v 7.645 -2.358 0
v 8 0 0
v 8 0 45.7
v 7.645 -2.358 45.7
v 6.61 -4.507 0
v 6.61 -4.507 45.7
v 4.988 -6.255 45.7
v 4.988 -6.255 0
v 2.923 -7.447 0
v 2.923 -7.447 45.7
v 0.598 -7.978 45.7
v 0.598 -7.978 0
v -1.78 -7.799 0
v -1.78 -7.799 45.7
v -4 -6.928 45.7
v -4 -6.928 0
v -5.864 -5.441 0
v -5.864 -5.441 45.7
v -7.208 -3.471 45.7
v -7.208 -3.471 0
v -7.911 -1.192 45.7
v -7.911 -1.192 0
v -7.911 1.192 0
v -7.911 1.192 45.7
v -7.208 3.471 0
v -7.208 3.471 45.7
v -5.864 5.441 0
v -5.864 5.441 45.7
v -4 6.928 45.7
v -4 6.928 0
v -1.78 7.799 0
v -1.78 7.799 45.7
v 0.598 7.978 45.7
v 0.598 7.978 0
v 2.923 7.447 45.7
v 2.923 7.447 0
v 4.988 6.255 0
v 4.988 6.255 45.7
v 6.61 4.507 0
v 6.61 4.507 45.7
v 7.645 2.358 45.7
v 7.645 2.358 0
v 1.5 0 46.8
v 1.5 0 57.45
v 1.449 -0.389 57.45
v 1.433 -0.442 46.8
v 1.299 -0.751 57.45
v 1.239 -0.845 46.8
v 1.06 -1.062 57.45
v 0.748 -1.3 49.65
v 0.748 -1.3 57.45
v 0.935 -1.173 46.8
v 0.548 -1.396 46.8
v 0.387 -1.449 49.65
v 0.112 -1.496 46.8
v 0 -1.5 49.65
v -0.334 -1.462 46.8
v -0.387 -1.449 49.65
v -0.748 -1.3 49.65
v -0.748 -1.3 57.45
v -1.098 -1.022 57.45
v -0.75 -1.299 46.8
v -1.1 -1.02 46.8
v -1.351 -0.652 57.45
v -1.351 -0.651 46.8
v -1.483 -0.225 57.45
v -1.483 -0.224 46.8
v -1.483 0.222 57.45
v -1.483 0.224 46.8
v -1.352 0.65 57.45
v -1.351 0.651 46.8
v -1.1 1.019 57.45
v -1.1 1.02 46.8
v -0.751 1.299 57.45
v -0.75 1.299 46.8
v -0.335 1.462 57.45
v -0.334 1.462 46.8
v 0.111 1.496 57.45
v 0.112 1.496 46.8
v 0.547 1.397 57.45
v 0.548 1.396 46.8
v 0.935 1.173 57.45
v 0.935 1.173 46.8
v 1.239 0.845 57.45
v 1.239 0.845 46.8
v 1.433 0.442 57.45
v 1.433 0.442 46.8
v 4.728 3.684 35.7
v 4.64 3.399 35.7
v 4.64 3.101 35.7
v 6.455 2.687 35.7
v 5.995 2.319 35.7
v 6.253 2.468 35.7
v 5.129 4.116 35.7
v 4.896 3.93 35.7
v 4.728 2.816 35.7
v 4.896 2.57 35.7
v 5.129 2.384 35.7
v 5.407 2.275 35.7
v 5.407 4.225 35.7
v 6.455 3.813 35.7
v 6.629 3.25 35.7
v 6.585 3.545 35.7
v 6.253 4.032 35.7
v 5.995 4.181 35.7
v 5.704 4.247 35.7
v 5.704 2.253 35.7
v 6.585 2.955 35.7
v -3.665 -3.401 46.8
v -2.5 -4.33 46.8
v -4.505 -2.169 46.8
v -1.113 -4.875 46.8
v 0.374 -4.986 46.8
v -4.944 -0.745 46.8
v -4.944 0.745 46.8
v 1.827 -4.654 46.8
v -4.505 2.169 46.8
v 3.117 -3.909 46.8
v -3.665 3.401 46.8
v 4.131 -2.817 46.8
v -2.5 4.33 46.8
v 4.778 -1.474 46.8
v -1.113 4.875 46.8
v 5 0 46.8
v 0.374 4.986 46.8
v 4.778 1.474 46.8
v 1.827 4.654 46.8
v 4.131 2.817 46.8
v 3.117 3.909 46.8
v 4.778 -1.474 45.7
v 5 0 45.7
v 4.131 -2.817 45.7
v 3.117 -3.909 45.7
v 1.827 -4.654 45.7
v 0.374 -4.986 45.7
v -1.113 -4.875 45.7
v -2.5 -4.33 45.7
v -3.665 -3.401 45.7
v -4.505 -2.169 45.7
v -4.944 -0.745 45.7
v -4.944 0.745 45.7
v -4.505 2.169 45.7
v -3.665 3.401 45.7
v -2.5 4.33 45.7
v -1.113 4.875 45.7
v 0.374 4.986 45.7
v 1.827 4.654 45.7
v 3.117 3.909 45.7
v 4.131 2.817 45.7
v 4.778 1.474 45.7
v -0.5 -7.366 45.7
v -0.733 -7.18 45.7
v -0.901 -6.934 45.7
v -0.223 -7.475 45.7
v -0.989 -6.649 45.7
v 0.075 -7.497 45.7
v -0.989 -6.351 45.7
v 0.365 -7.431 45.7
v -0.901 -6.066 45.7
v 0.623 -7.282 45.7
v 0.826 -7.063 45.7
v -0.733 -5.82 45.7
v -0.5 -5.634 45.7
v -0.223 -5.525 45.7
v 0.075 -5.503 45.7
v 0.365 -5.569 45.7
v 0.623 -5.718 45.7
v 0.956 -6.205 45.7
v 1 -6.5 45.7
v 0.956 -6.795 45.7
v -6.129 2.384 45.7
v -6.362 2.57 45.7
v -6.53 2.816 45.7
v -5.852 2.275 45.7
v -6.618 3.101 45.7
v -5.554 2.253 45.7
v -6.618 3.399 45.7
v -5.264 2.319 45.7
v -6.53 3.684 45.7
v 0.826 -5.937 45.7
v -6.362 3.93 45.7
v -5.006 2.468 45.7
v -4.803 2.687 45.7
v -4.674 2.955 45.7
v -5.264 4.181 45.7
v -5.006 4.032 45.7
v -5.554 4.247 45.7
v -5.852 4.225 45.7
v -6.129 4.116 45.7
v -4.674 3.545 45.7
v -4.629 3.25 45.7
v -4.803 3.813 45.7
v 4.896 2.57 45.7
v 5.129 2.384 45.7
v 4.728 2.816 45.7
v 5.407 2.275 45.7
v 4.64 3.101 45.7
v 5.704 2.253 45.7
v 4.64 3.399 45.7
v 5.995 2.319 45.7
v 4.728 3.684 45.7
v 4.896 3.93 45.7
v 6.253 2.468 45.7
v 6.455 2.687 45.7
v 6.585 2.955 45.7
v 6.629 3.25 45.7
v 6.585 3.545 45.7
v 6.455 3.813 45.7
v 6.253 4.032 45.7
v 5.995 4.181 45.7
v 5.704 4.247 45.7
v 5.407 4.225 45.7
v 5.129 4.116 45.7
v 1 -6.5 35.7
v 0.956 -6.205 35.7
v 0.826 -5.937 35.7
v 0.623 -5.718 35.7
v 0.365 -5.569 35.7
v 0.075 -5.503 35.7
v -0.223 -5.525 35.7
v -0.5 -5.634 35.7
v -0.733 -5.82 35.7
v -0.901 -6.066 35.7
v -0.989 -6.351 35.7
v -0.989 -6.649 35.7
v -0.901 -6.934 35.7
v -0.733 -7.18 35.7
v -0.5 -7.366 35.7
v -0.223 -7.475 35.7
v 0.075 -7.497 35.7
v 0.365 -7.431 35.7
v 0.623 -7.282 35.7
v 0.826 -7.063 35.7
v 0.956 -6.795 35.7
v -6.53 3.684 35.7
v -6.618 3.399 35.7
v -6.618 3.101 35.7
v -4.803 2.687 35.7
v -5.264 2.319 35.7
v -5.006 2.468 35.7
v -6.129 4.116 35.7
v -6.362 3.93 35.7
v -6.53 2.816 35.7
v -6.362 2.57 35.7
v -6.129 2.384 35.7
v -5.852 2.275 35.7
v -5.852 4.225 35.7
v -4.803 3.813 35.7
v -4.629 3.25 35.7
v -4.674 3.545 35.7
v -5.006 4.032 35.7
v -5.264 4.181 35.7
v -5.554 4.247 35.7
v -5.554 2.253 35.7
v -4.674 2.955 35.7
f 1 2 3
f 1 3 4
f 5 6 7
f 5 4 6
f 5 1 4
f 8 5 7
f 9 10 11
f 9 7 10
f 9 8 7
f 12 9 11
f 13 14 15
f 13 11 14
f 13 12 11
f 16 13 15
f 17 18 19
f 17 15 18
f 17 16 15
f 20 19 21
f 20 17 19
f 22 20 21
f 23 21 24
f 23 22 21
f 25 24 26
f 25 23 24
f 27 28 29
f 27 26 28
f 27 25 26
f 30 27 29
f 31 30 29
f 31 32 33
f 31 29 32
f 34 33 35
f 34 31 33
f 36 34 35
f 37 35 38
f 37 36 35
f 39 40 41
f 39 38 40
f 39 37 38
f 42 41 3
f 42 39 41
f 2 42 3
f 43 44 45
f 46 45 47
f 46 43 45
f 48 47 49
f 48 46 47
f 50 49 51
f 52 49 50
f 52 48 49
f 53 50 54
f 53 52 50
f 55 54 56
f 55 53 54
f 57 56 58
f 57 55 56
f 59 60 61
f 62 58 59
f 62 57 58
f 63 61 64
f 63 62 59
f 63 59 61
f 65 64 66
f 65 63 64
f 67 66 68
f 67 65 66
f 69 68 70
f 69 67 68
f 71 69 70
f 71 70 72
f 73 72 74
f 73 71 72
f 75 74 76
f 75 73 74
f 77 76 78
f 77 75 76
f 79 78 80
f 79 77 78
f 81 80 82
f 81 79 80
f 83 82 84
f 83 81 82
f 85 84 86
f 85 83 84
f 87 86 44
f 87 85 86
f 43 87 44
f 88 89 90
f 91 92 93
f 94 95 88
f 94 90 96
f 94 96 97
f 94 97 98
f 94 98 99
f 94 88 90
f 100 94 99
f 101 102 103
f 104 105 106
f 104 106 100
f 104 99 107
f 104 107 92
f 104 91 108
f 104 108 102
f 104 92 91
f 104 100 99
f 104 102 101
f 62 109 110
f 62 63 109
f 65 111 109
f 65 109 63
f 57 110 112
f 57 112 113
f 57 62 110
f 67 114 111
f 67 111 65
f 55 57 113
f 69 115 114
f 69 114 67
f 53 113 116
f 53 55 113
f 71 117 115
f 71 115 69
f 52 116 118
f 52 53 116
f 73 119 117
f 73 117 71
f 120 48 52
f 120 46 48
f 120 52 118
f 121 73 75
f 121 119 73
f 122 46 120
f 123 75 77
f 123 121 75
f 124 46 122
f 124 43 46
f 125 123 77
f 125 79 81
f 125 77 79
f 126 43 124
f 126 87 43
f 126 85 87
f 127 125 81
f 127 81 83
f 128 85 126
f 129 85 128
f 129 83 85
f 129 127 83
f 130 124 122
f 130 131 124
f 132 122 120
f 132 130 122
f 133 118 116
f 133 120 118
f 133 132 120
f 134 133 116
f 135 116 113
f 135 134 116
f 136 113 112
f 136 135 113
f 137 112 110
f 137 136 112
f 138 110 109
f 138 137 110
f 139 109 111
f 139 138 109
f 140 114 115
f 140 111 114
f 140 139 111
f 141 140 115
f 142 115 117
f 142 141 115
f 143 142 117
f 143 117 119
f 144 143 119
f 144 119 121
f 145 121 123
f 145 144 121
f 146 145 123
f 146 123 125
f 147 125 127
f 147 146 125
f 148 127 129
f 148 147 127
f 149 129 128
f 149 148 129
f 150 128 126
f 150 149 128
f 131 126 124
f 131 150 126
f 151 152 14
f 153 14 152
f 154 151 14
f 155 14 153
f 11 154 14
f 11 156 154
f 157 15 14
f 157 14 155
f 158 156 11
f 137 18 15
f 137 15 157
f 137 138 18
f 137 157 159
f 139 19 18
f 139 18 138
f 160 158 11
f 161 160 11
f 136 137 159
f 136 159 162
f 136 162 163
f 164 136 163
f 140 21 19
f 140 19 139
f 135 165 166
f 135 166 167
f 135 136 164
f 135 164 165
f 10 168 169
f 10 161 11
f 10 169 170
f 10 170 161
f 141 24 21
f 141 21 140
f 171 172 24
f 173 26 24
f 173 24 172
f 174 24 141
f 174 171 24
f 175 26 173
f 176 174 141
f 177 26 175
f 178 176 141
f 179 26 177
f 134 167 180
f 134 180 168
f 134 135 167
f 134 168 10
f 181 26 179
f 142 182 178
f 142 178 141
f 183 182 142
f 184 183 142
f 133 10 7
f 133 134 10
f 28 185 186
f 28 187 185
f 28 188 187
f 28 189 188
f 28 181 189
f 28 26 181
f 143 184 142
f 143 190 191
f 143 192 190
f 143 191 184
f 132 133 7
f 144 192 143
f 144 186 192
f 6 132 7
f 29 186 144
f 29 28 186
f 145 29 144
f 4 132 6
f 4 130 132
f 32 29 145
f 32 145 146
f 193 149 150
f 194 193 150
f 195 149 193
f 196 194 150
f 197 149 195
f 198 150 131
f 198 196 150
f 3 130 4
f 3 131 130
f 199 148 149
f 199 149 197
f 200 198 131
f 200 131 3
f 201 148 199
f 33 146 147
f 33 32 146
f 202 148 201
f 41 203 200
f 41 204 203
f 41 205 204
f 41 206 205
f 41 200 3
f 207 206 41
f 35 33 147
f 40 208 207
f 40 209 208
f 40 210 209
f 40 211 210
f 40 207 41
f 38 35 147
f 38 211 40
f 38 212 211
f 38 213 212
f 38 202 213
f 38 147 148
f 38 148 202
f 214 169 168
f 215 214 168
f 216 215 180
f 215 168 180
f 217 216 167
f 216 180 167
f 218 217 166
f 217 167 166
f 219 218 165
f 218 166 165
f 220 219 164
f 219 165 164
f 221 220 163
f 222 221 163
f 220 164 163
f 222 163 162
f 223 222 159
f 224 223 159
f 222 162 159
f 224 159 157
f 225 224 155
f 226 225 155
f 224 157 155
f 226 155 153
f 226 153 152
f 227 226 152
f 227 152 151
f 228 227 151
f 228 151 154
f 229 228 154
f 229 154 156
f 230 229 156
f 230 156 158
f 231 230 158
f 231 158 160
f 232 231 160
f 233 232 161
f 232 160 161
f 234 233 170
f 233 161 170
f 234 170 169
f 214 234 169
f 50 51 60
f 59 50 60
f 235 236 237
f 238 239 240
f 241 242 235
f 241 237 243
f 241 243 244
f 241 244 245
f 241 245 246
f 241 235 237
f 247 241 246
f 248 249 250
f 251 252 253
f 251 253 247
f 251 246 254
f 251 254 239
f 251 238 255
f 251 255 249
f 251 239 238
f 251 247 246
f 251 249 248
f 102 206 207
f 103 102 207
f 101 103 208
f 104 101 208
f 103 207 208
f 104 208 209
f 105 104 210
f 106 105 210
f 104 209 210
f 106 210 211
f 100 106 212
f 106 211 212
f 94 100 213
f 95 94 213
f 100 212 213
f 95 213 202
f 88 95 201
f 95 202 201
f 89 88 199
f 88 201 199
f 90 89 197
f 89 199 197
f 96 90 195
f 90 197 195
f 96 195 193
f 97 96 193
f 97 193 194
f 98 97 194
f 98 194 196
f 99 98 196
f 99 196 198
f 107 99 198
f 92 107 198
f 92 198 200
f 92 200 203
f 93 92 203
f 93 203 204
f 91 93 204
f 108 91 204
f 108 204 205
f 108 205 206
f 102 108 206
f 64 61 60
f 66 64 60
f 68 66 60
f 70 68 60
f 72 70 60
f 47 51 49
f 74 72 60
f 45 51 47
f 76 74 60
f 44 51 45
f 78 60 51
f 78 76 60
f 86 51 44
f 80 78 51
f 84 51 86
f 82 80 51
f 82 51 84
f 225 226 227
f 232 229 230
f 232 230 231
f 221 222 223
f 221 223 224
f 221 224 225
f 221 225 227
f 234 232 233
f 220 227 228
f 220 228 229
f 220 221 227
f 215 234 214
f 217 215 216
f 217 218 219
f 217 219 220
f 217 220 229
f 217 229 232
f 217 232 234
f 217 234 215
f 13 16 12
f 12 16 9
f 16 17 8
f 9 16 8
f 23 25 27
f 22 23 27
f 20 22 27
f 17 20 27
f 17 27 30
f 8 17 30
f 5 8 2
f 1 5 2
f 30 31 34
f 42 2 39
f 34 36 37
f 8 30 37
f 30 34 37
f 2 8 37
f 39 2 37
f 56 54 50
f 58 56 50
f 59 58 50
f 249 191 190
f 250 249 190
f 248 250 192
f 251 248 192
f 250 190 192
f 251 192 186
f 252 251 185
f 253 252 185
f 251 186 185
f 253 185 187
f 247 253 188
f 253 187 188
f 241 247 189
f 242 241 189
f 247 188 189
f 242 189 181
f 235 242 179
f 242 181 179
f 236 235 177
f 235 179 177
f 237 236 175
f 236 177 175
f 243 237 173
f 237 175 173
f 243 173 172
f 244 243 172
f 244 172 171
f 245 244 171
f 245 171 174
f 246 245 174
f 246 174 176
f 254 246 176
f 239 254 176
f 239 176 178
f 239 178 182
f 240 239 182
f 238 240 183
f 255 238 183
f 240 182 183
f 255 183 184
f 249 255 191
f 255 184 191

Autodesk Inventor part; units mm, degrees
ref_plane "YZ Plane" through (0, 0, 0) normal (1, 0, 0) x (0, 1, 0)
ref_plane "XY Plane" through (0, 0, 0) normal (0, 0, 1) x (1, 0, 0)
sketch "Sketch1" plane through (0, 0, 0) normal (0, 0, 1) x (1, 0, 0)
  circle A0 centre (0, 0) radius 8
  dimension "d0" = 16
extrude "Extrusion1" add sketch "Sketch1" along normal blind 45.7
sketch "Sketch2" plane through (0, 0, 45.7) normal (0, 0, 1) x (1, 0, 0)
  line L0 (0, 0) -> (0, -6.5)
  circle A0 centre (0, -6.5) radius 1
  circle A1 centre (5.6292, 3.25) radius 1
  circle A2 centre (-5.6292, 3.25) radius 1
  dimension "d8" = 360
  dimension "d38" = 6.5
  dimension "d39" = 2
  dimension "d42" = 360
extrude "Extrusion2" cut sketch "Sketch2" against normal blind 10
sketch "Sketch3" plane through (0, 0, 45.7) normal (0, 0, 1) x (1, 0, 0)
  circle A0 centre (0, 0) radius 5
  dimension "d12" = 10
extrude "Extrusion3" add sketch "Sketch3" along normal blind 1.1
sketch "Sketch8" plane through (0, 0, 46.8) normal (0, 0, 1) x (1, 0, 0)
  circle A0 centre (0, 0) radius 1.5
  dimension "d31" = 3
extrude "Extrusion8" add sketch "Sketch8" along normal blind 10.65
ref_plane "Work Plane5" through (0, -1.5, 46.8) normal (0, 1, 0) x (-1, 0, 0)
sketch "Sketch9" plane through (0, -1.5, 46.8) normal (0, 1, 0) x (-1, 0, 0)
  line L0 (1.5, 10.65) -> (-1.5, 10.65) projected
  line L1 (0, 10.65) -> (1.5, 10.65)
  line L2 (1.5, 10.65) -> (1.5, 2.85)
  line L3 (1.5, 2.85) -> (-1.5, 2.85)
  line L4 (-1.5, 2.85) -> (-1.5, 10.65)
  line L5 (-1.5, 10.65) -> (0, 10.65)
  point P0 (0, -46.8)
  dimension "d34" = 1.5
  dimension "d35" = 7.8
extrude "Extrusion9" cut sketch "Sketch9" along normal blind 0.2
properties part number "Motor"
